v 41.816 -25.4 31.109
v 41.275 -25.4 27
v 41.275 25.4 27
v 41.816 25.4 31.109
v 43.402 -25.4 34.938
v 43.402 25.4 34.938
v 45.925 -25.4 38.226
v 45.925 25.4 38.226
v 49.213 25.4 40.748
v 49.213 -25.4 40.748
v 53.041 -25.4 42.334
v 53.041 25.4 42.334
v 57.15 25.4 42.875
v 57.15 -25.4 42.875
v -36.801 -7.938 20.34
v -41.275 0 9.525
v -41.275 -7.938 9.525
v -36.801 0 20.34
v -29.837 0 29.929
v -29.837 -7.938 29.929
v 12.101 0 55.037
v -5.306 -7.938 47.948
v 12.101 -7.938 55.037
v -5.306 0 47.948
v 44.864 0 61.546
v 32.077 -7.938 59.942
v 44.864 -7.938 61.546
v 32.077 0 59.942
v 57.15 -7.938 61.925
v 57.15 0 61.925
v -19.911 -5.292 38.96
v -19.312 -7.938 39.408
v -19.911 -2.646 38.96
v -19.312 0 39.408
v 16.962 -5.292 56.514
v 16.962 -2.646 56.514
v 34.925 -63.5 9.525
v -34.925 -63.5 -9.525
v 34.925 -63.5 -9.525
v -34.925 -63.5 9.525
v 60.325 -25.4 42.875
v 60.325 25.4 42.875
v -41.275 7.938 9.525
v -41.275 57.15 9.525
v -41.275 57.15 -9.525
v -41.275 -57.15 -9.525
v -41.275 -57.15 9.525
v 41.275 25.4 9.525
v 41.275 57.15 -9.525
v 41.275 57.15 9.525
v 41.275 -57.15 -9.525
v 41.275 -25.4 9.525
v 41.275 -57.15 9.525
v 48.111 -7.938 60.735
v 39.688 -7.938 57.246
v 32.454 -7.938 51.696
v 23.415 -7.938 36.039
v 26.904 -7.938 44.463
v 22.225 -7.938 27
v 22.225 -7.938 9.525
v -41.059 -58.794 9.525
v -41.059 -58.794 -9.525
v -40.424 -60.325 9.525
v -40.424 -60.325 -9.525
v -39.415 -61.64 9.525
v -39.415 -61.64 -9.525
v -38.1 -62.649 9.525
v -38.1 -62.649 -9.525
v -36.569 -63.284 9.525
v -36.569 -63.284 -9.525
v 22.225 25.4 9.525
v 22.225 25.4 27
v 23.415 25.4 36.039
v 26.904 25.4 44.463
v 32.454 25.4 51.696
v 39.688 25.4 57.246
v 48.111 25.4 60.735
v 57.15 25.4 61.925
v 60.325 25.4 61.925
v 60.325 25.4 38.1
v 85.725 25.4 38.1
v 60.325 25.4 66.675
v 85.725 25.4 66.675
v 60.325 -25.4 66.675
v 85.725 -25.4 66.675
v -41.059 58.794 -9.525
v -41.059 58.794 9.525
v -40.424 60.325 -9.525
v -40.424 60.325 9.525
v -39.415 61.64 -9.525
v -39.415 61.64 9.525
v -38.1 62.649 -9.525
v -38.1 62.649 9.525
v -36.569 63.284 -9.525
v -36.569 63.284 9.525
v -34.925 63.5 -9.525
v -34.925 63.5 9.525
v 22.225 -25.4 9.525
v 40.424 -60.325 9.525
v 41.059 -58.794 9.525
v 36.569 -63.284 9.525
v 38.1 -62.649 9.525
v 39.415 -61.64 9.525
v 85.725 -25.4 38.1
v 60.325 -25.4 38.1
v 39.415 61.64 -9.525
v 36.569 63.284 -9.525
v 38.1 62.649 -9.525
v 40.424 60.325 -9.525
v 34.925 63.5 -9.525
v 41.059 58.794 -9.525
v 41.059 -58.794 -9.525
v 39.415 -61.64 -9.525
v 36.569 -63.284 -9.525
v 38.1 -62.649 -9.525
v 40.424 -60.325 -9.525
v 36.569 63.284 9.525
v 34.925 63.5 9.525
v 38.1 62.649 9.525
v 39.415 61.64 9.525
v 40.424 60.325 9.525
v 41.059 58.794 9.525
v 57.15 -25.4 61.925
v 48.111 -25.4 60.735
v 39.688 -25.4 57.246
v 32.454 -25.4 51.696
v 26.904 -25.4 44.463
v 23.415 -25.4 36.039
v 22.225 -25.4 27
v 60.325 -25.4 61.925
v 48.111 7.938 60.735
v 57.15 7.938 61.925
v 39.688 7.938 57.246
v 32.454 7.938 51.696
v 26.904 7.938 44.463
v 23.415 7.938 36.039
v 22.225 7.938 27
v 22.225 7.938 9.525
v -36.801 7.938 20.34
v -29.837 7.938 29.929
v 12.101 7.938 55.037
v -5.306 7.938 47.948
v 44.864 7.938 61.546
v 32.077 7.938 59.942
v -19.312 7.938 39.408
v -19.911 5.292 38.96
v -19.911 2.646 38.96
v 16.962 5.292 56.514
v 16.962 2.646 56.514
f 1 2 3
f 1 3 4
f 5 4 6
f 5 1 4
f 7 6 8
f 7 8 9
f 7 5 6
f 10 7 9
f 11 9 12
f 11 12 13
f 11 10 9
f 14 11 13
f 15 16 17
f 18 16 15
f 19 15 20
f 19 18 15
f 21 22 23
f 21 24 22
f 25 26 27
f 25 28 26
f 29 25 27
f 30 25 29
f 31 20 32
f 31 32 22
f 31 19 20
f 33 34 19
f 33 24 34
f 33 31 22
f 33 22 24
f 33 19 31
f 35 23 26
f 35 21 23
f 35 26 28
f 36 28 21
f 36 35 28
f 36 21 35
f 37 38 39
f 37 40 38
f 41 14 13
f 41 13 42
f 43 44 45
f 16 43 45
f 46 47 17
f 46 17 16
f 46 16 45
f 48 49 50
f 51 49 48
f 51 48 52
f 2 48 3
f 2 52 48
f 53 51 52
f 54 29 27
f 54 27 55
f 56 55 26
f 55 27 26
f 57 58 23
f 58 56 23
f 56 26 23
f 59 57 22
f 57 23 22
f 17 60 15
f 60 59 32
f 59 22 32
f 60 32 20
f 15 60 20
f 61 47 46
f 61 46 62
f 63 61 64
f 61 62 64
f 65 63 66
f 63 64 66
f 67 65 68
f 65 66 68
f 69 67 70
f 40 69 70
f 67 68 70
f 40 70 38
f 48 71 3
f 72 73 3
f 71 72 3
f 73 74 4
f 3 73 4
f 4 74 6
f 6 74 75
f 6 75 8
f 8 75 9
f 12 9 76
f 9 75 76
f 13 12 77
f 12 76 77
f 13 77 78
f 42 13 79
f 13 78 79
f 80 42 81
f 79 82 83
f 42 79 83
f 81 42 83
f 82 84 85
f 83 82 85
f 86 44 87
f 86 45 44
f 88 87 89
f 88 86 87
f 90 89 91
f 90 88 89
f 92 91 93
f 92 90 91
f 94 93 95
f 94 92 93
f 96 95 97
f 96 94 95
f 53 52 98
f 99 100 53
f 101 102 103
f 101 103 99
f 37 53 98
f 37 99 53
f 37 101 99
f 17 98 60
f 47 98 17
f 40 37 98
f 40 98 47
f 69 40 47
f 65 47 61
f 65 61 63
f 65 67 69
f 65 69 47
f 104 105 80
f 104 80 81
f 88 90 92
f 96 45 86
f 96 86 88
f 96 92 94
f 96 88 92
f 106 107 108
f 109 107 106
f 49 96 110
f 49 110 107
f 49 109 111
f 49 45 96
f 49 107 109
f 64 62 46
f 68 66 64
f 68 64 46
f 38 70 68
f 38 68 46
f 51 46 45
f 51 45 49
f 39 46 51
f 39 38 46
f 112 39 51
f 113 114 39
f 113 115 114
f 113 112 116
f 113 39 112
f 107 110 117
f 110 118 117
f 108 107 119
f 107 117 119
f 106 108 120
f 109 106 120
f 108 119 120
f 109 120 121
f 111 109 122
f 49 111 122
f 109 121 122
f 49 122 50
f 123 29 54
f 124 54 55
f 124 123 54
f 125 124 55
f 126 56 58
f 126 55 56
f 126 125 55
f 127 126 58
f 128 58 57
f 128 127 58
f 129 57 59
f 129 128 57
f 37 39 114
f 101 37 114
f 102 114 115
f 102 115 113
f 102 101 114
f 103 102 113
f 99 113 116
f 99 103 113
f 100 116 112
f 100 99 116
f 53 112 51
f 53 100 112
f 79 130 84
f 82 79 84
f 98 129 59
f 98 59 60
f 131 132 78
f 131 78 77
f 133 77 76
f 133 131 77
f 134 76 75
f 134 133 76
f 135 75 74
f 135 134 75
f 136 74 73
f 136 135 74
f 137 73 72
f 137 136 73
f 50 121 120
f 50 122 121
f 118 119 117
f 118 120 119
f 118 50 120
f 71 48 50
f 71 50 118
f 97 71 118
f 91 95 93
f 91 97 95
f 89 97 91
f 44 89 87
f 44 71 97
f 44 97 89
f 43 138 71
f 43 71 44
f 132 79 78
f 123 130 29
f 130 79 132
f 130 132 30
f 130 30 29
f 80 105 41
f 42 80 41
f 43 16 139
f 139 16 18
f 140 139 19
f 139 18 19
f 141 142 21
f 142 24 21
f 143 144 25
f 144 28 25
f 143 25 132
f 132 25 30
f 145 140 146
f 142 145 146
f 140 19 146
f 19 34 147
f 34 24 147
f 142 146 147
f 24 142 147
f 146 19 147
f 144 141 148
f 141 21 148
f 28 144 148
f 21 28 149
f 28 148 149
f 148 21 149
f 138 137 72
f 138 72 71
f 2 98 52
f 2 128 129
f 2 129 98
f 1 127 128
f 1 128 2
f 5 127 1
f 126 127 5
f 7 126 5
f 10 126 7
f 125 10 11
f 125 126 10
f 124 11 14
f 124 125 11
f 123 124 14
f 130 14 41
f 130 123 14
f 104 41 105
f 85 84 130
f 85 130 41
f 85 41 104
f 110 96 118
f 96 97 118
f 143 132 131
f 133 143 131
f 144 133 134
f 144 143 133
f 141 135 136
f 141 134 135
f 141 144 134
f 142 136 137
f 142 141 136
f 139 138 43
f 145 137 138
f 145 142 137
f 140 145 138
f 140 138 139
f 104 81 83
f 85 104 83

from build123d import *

# Parameters (mm, degrees)
F1_DEPTH = 63.5
F0_W     = 25.4
F0_H     = 19.0499988828
F0_H_2   = 4.7498011172
F0_H_3   = 4.7752
F2_DEPTH = 25.4
F3_DEPTH = 7.9375
F4_R     = 6.35


with BuildPart() as f1:
    # F0 (on Front) → F1 (new body, symmetric)
    with BuildSketch(Plane.XZ):
        Polygon((-41.275, 9.525), (-41.275, -9.525), (41.275, -9.525), (41.275, 9.525), (22.2250011172, 9.525), align=None)
    extrude(amount=F1_DEPTH, both=True)

    # F0 (on Front) → F2 (join, symmetric)
    with BuildSketch(Plane.XZ):
        with BuildLine():
            Line((22.2250011172, 9.525), (41.275, 9.525))
            Line((41.275, 9.525), (41.275, 27.0002))
            ThreePointArc((41.275, 27.0002), (45.9246798487, 38.2255201513), (57.15, 42.8752))
            Line((57.15, 42.8752), (60.325, 42.8752))
            Line((60.325, 42.8752), (60.325, 61.9251988828))
            Line((60.325, 61.9251988828), (57.15, 61.9251988828))
            ThreePointArc((57.15, 61.9251988828), (32.454296457, 51.695903543), (22.2250011172, 27.0002))
            Line((22.2250011172, 27.0002), (22.2250011172, 9.525))
        make_face()
        with Locations((73.025, 52.4001994414)):
            Rectangle(F0_W, F0_H)
        with Locations((73.025, 64.3000994414)):
            Rectangle(F0_W, F0_H_2)
        with Locations((73.025, 40.4876)):
            Rectangle(F0_W, F0_H_3)
    extrude(amount=F2_DEPTH, both=True)

    # F0 (on Front) → F3 (join, symmetric)
    with BuildSketch(Plane.XZ):
        with BuildLine():
            add(Edge.make_bspline(
                [(-41.275, 9.525), (-31.7300852137, 44.8146195103), (19.3697411857, 62.6715747871), (57.15, 61.9251988828)],
                knots=[0, 0, 0, 0, 111.5045356385, 111.5045356385, 111.5045356385, 111.5045356385], degree=3))
            Line((-41.275, 9.525), (22.2250011172, 9.525))
            Line((22.2250011172, 9.525), (22.2250011172, 27.0002))
            ThreePointArc((22.2250011172, 27.0002), (32.454296457, 51.695903543), (57.15, 61.9251988828))
        make_face()
    extrude(amount=F3_DEPTH, both=True)

    # F4
    f4_edges = [f1.edges().sort_by_distance(p)[0] for p in [
        (-41.275, -63.5, 0),
        (41.275, -63.5, 0),
        (41.275, 63.5, 0),
        (-41.275, 63.5, 0),
    ]]
    fillet(f4_edges, radius=F4_R)


solid = f1.part
